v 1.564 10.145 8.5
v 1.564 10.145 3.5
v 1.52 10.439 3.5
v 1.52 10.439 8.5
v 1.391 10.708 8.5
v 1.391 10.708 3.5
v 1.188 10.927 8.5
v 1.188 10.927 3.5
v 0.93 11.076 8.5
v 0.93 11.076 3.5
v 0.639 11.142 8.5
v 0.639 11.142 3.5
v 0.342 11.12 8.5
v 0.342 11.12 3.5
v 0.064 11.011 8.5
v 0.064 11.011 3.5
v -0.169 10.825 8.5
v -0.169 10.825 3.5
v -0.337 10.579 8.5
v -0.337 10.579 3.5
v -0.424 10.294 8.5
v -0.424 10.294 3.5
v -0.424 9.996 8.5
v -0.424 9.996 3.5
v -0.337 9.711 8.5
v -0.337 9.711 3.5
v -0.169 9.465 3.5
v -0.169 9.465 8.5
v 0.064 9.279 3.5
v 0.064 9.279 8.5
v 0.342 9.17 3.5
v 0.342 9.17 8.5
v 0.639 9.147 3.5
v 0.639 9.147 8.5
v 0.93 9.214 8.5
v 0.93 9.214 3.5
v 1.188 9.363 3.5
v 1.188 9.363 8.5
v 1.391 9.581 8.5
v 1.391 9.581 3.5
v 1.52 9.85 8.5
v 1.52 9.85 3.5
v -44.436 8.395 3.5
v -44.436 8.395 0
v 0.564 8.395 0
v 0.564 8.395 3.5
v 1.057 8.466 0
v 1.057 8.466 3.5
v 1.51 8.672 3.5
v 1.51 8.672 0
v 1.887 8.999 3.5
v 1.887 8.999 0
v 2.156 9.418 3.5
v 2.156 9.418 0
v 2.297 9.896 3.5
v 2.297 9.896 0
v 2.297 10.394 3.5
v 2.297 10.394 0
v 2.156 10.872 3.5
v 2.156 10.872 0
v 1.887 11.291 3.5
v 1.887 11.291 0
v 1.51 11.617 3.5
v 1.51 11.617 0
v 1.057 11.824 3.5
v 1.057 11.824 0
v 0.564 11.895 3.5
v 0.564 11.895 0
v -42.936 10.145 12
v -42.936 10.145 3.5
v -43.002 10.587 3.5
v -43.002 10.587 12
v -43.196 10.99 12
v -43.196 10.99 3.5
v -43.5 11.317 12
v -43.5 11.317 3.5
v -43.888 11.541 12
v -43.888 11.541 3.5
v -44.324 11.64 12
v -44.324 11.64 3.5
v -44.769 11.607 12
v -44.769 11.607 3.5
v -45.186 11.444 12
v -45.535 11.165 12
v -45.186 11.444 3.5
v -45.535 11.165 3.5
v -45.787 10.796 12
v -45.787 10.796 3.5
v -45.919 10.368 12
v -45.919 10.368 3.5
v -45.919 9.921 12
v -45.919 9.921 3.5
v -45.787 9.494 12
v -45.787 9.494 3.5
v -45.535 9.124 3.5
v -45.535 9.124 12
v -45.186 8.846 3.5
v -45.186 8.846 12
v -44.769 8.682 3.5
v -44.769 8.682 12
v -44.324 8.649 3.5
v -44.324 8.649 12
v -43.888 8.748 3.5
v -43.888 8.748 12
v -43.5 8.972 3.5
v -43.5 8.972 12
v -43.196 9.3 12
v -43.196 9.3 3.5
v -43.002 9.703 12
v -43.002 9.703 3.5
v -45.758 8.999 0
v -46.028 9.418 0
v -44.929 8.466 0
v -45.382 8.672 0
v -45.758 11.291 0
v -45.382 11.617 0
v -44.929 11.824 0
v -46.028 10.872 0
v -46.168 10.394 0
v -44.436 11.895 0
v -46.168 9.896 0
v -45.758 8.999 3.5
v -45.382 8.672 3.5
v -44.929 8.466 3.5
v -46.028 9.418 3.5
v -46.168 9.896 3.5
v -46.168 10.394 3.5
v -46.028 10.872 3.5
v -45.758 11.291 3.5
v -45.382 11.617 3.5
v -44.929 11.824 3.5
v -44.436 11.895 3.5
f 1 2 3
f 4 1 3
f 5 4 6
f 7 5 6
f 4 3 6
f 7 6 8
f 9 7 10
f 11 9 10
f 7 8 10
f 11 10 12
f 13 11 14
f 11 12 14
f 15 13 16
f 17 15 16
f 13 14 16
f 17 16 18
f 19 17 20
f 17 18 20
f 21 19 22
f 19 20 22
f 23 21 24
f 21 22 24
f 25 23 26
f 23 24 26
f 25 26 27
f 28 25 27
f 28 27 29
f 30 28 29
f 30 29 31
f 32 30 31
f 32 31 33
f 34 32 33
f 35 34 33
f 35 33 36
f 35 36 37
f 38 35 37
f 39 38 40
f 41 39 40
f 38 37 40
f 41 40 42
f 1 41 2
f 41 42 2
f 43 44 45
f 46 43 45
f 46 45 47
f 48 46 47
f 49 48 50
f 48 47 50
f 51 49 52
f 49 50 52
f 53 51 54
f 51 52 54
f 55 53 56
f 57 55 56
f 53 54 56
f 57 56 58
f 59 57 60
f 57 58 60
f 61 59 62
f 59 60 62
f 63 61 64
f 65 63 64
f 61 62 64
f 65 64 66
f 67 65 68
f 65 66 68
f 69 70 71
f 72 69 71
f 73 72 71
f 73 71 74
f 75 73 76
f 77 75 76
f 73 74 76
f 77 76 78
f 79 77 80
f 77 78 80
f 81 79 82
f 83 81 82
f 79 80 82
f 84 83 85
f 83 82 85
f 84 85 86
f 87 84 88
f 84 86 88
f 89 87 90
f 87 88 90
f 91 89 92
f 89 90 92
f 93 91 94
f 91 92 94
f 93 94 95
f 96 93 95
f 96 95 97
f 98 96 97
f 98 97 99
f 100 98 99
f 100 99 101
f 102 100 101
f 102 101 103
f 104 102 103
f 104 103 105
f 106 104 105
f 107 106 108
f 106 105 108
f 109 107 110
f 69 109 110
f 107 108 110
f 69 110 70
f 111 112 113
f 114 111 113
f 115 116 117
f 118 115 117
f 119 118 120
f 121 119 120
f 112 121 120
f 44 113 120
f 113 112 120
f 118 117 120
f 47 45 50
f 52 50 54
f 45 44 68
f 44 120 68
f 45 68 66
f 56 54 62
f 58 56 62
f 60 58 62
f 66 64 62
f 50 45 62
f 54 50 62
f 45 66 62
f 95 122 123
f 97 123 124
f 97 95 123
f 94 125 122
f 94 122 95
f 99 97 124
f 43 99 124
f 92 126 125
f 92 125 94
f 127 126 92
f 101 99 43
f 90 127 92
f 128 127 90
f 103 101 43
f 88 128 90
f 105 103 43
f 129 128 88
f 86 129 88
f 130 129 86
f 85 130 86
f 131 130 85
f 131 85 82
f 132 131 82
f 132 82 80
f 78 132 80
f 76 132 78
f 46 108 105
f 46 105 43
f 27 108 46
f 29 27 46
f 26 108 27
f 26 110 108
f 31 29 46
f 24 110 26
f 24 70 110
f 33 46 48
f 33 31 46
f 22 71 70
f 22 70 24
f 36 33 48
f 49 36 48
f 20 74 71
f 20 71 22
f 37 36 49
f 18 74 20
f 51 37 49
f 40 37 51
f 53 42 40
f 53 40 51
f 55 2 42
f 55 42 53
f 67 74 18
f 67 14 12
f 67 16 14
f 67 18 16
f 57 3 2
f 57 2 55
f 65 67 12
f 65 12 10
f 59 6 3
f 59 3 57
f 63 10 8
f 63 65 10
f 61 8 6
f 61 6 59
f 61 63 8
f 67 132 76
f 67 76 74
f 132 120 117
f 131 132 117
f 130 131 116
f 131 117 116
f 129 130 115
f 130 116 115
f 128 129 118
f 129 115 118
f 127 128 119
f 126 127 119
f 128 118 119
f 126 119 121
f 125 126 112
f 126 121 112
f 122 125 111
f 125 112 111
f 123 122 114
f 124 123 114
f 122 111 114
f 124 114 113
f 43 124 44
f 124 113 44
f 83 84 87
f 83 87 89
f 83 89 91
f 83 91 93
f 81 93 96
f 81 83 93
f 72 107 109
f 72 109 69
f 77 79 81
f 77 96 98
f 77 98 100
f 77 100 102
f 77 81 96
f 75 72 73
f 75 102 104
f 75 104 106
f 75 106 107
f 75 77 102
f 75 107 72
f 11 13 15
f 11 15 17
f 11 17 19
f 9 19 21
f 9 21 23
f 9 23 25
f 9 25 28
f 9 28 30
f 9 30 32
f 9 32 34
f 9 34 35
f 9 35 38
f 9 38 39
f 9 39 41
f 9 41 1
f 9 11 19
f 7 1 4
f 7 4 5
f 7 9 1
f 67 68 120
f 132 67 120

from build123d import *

# Parameters (mm, degrees)
BOSS_EXTRUDE1_DEPTH = 3.5
SKETCH2_R           = 1.5
BOSS_EXTRUDE2_DEPTH = 8.5
SKETCH3_R           = 1
BOSS_EXTRUDE3_DEPTH = 5


with BuildPart() as part:
    # Sketch1 → Boss-Extrude1 (new body)
    with BuildSketch(Plane.XY):
        with BuildLine():
            Line((-44.435656646, 8.394675461), (0.564343354, 8.394675461))
            ThreePointArc((0.564343354, 8.394675461), (2.314343354, 10.144675461), (0.564343354, 11.894675461))
            Line((0.564343354, 11.894675461), (-44.435656646, 11.894675461))
            ThreePointArc((-44.435656646, 11.894675461), (-46.185656646, 10.144675461), (-44.435656646, 8.394675461))
        make_face()
    extrude(amount=BOSS_EXTRUDE1_DEPTH)

    # Sketch2 → Boss-Extrude2 (add)
    with BuildSketch(Plane.XY.offset(3.5)):
        with Locations((-44.435656646, 10.144675461)):
            Circle(SKETCH2_R)
    extrude(amount=BOSS_EXTRUDE2_DEPTH)

    # Sketch3 → Boss-Extrude3 (add)
    with BuildSketch(Plane.XY.offset(3.5)):
        with Locations((0.564343354, 10.144675461)):
            Circle(SKETCH3_R)
    extrude(amount=BOSS_EXTRUDE3_DEPTH)


solid = part.part
